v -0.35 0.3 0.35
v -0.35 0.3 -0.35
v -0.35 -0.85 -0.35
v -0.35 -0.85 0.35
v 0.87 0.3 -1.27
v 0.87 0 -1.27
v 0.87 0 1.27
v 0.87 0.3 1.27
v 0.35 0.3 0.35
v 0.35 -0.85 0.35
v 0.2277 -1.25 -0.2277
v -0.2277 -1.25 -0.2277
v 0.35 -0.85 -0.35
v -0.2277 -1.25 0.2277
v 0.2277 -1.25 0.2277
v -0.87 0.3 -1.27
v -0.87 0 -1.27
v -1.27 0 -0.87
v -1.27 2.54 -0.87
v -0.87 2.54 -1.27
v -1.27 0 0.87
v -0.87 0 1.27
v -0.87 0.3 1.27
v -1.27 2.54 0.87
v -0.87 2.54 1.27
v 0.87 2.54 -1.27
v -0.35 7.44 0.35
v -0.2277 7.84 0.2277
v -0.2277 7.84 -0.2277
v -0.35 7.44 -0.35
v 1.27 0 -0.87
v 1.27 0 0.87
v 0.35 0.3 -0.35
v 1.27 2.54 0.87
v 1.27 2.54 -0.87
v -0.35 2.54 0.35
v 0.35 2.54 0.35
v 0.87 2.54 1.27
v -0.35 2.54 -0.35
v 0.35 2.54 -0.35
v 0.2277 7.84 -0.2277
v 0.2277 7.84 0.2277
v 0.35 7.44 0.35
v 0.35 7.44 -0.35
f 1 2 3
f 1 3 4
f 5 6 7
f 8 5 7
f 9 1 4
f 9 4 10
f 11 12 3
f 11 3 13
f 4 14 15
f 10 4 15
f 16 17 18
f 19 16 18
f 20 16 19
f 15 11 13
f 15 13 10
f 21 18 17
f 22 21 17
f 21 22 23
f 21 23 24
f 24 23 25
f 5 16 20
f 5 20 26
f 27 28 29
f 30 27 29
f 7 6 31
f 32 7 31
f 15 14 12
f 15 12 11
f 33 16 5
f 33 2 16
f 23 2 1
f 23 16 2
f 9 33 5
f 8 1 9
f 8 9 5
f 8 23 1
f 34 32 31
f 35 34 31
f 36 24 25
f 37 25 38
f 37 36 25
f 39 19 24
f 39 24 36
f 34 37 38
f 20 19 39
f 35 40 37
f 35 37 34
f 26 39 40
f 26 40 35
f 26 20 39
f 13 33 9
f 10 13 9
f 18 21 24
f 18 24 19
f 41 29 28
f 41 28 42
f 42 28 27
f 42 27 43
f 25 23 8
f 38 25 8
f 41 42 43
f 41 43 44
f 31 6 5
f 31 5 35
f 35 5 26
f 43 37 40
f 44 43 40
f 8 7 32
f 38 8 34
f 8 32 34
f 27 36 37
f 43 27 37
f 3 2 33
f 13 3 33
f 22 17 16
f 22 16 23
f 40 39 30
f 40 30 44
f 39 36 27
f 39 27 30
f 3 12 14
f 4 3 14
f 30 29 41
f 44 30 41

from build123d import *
from OCP.BRepFilletAPI import BRepFilletAPI_MakeChamfer

# Parameters (mm, degrees)
SKETCH1_W           = 2.54
SKETCH1_H           = 2.54
BOSS_EXTRUDE1_DEPTH = 2.54
CHAMFER1_SIZE       = 0.4
SKETCH2_W           = 1.74
SKETCH2_H           = 2.54
CUT_EXTRUDE1_DEPTH  = 0.3
SKETCH3_W           = 0.7
SKETCH3_H           = 0.7
BOSS_EXTRUDE2_DEPTH = 5.3
SKETCH4_W           = 0.7
SKETCH4_H           = 0.7
BOSS_EXTRUDE3_DEPTH = 1.55
CHAMFER2_SIZE       = 0.4
CHAMFER2_SIZE2      = 0.122292273


with BuildPart() as part:
    # Sketch1 → Boss-Extrude1 (new body)
    with BuildSketch(Plane(origin=(0, 0, 0), x_dir=(1, 0, 0), z_dir=(0, 1, 0))):
        Rectangle(SKETCH1_W, SKETCH1_H)
    extrude(amount=BOSS_EXTRUDE1_DEPTH)

    # Chamfer1
    chamfer1_edges = [part.edges().sort_by_distance(p)[0] for p in [
        (1.27, 1.27, 1.27),
        (-1.27, 1.27, 1.27),
        (-1.27, 1.27, -1.27),
        (1.27, 1.27, -1.27),
    ]]
    chamfer(chamfer1_edges, length=CHAMFER1_SIZE)

    # Sketch2 → Cut-Extrude1 (cut)
    with BuildSketch(Plane.XZ):
        Rectangle(SKETCH2_W, SKETCH2_H)
    extrude(amount=-CUT_EXTRUDE1_DEPTH, mode=Mode.SUBTRACT)

    # Sketch3 → Boss-Extrude2 (add)
    with BuildSketch(Plane(origin=(0, 2.54, 0), x_dir=(1, 0, 0), z_dir=(0, 1, 0))):
        Rectangle(SKETCH3_W, SKETCH3_H)
    extrude(amount=BOSS_EXTRUDE2_DEPTH)

    # Sketch4 → Boss-Extrude3 (add)
    with BuildSketch(Plane.XZ.offset(-0.3)):
        Rectangle(SKETCH4_W, SKETCH4_H)
    extrude(amount=BOSS_EXTRUDE3_DEPTH)

    # Chamfer2: one chamfer whose edges measure the first distance from different faces: ONE call of the kernel's chamfer builder (chamfer() names one face for all edges)
    chamfer2_edges_1 = [part.edges().sort_by_distance(p)[0] for p in [
        (-0.35, 7.84, 0),
    ]]
    chamfer2_side_1 = [part.faces().sort_by_distance(p)[0] for p in [
        (-0.35, 5.19, 0),
    ]]
    chamfer2_edges_2 = [part.edges().sort_by_distance(p)[0] for p in [
        (0, 7.84, 0.35),
    ]]
    chamfer2_side_2 = [part.faces().sort_by_distance(p)[0] for p in [
        (0, 5.19, 0.35),
    ]]
    chamfer2_edges_3 = [part.edges().sort_by_distance(p)[0] for p in [
        (0.35, 7.84, 0),
    ]]
    chamfer2_side_3 = [part.faces().sort_by_distance(p)[0] for p in [
        (0.35, 5.19, 0),
    ]]
    chamfer2_edges_4 = [part.edges().sort_by_distance(p)[0] for p in [
        (0, 7.84, -0.35),
    ]]
    chamfer2_side_4 = [part.faces().sort_by_distance(p)[0] for p in [
        (0, 5.19, -0.35),
    ]]
    chamfer2_edges_5 = [part.edges().sort_by_distance(p)[0] for p in [
        (0.35, -1.25, 0),
    ]]
    chamfer2_side_5 = [part.faces().sort_by_distance(p)[0] for p in [
        (0.35, -0.475, 0),
    ]]
    chamfer2_edges_6 = [part.edges().sort_by_distance(p)[0] for p in [
        (0, -1.25, 0.35),
    ]]
    chamfer2_side_6 = [part.faces().sort_by_distance(p)[0] for p in [
        (0, -0.475, 0.35),
    ]]
    chamfer2_edges_7 = [part.edges().sort_by_distance(p)[0] for p in [
        (-0.35, -1.25, 0),
    ]]
    chamfer2_side_7 = [part.faces().sort_by_distance(p)[0] for p in [
        (-0.35, -0.475, 0),
    ]]
    chamfer2_edges_8 = [part.edges().sort_by_distance(p)[0] for p in [
        (0, -1.25, -0.35),
    ]]
    chamfer2_side_8 = [part.faces().sort_by_distance(p)[0] for p in [
        (0, -0.475, -0.35),
    ]]
    chamfer2 = BRepFilletAPI_MakeChamfer(part.part.solid().wrapped)
    for e in chamfer2_edges_1:
        chamfer2.Add(CHAMFER2_SIZE, CHAMFER2_SIZE2, e.wrapped, chamfer2_side_1[0].wrapped)  # the first distance lies on this face
    for e in chamfer2_edges_2:
        chamfer2.Add(CHAMFER2_SIZE, CHAMFER2_SIZE2, e.wrapped, chamfer2_side_2[0].wrapped)  # the first distance lies on this face
    for e in chamfer2_edges_3:
        chamfer2.Add(CHAMFER2_SIZE, CHAMFER2_SIZE2, e.wrapped, chamfer2_side_3[0].wrapped)  # the first distance lies on this face
    for e in chamfer2_edges_4:
        chamfer2.Add(CHAMFER2_SIZE, CHAMFER2_SIZE2, e.wrapped, chamfer2_side_4[0].wrapped)  # the first distance lies on this face
    for e in chamfer2_edges_5:
        chamfer2.Add(CHAMFER2_SIZE, CHAMFER2_SIZE2, e.wrapped, chamfer2_side_5[0].wrapped)  # the first distance lies on this face
    for e in chamfer2_edges_6:
        chamfer2.Add(CHAMFER2_SIZE, CHAMFER2_SIZE2, e.wrapped, chamfer2_side_6[0].wrapped)  # the first distance lies on this face
    for e in chamfer2_edges_7:
        chamfer2.Add(CHAMFER2_SIZE, CHAMFER2_SIZE2, e.wrapped, chamfer2_side_7[0].wrapped)  # the first distance lies on this face
    for e in chamfer2_edges_8:
        chamfer2.Add(CHAMFER2_SIZE, CHAMFER2_SIZE2, e.wrapped, chamfer2_side_8[0].wrapped)  # the first distance lies on this face
    add(Compound.cast(chamfer2.Shape()), mode=Mode.REPLACE)


solid = part.part
